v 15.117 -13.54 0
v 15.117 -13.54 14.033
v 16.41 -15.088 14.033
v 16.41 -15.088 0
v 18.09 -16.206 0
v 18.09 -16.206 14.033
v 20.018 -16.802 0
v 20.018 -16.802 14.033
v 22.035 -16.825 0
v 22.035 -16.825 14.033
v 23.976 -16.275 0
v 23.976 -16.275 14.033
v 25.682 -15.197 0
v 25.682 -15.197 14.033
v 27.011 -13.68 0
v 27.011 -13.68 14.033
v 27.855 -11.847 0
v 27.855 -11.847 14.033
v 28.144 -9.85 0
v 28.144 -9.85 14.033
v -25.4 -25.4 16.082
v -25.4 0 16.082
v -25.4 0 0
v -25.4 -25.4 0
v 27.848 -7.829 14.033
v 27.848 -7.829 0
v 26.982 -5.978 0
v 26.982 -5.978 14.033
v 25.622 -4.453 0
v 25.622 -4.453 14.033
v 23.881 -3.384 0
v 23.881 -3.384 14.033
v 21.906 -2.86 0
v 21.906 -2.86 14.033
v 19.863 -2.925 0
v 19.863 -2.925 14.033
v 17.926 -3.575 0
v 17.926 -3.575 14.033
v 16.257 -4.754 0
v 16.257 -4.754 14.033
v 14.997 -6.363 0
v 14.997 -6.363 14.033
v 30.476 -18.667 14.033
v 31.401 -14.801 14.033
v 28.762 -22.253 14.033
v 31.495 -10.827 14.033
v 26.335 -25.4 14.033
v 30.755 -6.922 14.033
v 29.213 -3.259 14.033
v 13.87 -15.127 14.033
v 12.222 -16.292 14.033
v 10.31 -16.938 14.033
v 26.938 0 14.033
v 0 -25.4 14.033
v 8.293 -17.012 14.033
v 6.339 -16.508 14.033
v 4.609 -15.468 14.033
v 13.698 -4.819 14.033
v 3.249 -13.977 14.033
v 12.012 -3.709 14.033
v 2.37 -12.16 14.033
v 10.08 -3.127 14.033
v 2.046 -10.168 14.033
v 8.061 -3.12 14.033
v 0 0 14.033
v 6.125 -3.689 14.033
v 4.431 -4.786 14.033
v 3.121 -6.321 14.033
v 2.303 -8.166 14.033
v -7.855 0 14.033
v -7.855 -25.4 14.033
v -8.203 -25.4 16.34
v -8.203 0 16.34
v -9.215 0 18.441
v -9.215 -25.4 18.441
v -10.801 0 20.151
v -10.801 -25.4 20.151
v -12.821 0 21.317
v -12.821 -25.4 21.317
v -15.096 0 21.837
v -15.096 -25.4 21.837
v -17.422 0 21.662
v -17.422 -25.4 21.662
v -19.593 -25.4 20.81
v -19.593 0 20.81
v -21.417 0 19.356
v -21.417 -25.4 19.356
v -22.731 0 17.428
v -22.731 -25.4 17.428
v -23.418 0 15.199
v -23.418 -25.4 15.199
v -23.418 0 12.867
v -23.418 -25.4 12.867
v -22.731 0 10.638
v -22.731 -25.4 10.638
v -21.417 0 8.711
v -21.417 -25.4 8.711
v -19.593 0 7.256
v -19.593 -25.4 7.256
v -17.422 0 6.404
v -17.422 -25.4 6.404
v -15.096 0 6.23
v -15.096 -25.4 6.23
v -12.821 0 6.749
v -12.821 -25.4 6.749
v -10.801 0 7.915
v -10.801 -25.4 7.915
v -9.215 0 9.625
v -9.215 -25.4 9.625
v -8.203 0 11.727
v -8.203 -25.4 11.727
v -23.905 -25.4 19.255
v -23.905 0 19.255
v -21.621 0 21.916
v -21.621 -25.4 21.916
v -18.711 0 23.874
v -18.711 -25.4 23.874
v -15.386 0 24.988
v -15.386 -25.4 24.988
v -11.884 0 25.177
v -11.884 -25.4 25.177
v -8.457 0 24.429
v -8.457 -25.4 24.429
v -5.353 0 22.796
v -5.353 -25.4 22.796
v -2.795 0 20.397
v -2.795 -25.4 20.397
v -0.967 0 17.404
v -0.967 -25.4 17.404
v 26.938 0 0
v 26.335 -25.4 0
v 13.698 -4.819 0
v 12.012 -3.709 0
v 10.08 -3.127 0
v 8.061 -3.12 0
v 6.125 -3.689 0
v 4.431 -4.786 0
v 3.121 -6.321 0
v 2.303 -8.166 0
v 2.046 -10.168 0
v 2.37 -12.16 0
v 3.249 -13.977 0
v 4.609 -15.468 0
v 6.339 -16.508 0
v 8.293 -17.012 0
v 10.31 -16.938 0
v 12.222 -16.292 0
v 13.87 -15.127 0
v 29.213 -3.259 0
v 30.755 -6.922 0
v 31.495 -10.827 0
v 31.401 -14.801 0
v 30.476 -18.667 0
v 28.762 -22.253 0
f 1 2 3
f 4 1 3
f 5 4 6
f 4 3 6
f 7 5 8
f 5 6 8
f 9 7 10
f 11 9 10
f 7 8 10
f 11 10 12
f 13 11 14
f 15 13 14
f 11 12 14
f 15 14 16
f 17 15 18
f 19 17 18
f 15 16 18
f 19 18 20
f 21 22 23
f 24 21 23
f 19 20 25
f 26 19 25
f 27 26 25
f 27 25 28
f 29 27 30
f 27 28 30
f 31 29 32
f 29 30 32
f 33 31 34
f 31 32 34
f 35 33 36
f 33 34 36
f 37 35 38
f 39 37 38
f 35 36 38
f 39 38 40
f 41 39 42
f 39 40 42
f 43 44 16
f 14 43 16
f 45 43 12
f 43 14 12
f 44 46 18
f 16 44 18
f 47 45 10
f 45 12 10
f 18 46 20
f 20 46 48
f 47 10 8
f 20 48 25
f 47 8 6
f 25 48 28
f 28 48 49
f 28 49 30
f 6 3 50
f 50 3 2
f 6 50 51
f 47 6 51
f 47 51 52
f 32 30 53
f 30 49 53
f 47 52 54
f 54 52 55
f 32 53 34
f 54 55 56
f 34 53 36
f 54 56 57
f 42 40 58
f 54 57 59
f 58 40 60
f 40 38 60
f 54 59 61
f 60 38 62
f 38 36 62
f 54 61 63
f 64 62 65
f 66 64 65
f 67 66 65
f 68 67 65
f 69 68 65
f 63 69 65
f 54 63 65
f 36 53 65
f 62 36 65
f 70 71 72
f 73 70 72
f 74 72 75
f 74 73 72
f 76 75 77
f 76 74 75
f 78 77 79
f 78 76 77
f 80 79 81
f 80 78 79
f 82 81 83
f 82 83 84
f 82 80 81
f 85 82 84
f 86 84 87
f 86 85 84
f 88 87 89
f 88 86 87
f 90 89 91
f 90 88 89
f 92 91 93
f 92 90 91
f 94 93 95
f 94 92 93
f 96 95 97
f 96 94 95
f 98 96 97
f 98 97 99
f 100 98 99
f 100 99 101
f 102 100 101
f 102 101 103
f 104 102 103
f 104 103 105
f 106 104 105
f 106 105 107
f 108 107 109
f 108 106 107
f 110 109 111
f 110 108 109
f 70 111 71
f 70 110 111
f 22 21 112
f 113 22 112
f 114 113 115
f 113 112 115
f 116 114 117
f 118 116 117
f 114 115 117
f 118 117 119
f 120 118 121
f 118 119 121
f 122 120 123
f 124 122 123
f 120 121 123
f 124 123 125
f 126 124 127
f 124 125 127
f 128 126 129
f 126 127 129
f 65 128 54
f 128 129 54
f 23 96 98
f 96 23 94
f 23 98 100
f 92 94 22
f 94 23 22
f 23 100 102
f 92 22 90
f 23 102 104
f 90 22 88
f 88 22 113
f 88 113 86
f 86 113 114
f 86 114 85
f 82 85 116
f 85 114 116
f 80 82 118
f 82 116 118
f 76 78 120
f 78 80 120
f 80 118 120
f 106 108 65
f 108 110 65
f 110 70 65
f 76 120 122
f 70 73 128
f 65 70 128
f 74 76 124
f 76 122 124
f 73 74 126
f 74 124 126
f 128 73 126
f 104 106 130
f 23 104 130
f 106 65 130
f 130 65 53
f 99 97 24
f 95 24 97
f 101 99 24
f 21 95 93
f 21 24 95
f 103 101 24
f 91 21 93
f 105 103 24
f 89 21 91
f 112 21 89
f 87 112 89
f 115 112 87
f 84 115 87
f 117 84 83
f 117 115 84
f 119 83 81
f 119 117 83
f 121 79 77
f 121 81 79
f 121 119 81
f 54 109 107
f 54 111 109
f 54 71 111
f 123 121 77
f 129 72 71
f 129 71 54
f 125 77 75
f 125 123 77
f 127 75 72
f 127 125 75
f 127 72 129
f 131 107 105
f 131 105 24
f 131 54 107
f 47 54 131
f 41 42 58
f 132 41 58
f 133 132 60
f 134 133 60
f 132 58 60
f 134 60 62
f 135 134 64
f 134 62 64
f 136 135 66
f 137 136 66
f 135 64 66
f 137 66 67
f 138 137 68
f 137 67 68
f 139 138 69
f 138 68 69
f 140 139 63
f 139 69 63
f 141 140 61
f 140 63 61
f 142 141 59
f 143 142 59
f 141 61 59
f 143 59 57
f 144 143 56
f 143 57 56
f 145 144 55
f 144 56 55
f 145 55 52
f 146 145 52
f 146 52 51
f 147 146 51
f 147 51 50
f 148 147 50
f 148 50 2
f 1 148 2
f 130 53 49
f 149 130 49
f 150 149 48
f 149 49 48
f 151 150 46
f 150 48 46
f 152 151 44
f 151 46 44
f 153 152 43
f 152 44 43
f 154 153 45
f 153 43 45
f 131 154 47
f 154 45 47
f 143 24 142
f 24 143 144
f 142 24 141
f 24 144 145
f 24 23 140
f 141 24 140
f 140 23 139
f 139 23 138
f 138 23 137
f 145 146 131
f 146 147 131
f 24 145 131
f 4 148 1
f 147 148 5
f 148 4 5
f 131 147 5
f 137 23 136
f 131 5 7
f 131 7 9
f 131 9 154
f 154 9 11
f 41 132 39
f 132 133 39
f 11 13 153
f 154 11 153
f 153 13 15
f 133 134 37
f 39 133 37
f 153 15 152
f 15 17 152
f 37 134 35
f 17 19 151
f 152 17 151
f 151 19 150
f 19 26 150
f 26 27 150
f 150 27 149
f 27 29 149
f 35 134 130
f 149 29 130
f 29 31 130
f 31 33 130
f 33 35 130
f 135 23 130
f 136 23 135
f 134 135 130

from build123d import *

# Parameters (mm, degrees)
F0_R     = 7.825273897
F1_DEPTH = 25.4
F3_DEPTH = 25.4
F5_DEPTH = 25.4
F7_DEPTH = 25.4


with BuildPart() as f1:
    # F0 (on Front) → F1 (new body)
    with BuildSketch(Plane.XZ):
        Polygon((0, 25.4), (-25.4, 25.4), (-25.4, 0), (31.75, 0), (31.75, 14.0331494874), (0, 14.0331494874), align=None)
        with Locations((-15.6803522259, 14.0331494874)):
            Circle(F0_R, mode=Mode.SUBTRACT)
    extrude(amount=F1_DEPTH)

    # F2 (on face) → F3 (cut)
    with BuildSketch(Plane.XY.offset(14.0331494874)):
        with BuildLine():
            ThreePointArc((15.1169737006, -13.5398786525), (15.8111405263, -11.8567285769), (16.0478653305, -10.0515075028))
            ThreePointArc((16.0478653305, -10.0515075028), (15.7801184051, -8.1338066206), (14.9973556185, -6.3627765504))
            ThreePointArc((14.9973556185, -6.3627765504), (14.0730886432, -9.9677288292), (15.1169737006, -13.5398786525))
        make_face()
        with BuildLine():
            ThreePointArc((14.9973556185, -6.3627765504), (15.7801184051, -8.1338066206), (16.0478653305, -10.0515075028))
            ThreePointArc((16.0478653305, -10.0515075028), (15.8111405263, -11.8567285769), (15.1169737006, -13.5398786525))
            ThreePointArc((15.1169737006, -13.5398786525), (23.0254188868, -16.6202802265), (28.1442228705, -9.8504777998))
            ThreePointArc((28.1442228705, -9.8504777998), (22.9123385557, -3.0496657427), (14.9973556185, -6.3627765504))
        make_face()
        with BuildLine():
            ThreePointArc((15.1169737006, -13.5398786525), (14.0730886432, -9.9677288292), (14.9973556185, -6.3627765504))
            ThreePointArc((14.9973556185, -6.3627765504), (2.0458192815, -10.1681828387), (15.1169737006, -13.5398786525))
        make_face()
    extrude(amount=-F3_DEPTH, mode=Mode.SUBTRACT)

    # F4 (on face) → F5 (cut)
    with BuildSketch(Plane.XY.offset(14.0331494874)):
        with BuildLine():
            ThreePointArc((26.9380398095, 0), (31.5529389663, -12.816734396), (26.3349507004, -25.4))
            Line((26.3349507004, -25.4), (31.75, -25.4))
            Line((31.75, -25.4), (31.75, 0))
            Line((31.75, 0), (26.9380398095, 0))
        make_face()
    extrude(amount=-F5_DEPTH, mode=Mode.SUBTRACT)

    # F6 (on face) → F7 (cut)
    with BuildSketch(Plane.XZ.offset(25.4)):
        with BuildLine():
            ThreePointArc((-25.4, 16.0824116319), (-11.8835850118, 25.1770035953), (0, 14.0331494874))
            Line((0, 14.0331494874), (0, 25.4))
            Line((0, 25.4), (-25.4, 25.4))
            Line((-25.4, 25.4), (-25.4, 16.0824116319))
        make_face()
    extrude(amount=-F7_DEPTH, mode=Mode.SUBTRACT)


solid = f1.part
